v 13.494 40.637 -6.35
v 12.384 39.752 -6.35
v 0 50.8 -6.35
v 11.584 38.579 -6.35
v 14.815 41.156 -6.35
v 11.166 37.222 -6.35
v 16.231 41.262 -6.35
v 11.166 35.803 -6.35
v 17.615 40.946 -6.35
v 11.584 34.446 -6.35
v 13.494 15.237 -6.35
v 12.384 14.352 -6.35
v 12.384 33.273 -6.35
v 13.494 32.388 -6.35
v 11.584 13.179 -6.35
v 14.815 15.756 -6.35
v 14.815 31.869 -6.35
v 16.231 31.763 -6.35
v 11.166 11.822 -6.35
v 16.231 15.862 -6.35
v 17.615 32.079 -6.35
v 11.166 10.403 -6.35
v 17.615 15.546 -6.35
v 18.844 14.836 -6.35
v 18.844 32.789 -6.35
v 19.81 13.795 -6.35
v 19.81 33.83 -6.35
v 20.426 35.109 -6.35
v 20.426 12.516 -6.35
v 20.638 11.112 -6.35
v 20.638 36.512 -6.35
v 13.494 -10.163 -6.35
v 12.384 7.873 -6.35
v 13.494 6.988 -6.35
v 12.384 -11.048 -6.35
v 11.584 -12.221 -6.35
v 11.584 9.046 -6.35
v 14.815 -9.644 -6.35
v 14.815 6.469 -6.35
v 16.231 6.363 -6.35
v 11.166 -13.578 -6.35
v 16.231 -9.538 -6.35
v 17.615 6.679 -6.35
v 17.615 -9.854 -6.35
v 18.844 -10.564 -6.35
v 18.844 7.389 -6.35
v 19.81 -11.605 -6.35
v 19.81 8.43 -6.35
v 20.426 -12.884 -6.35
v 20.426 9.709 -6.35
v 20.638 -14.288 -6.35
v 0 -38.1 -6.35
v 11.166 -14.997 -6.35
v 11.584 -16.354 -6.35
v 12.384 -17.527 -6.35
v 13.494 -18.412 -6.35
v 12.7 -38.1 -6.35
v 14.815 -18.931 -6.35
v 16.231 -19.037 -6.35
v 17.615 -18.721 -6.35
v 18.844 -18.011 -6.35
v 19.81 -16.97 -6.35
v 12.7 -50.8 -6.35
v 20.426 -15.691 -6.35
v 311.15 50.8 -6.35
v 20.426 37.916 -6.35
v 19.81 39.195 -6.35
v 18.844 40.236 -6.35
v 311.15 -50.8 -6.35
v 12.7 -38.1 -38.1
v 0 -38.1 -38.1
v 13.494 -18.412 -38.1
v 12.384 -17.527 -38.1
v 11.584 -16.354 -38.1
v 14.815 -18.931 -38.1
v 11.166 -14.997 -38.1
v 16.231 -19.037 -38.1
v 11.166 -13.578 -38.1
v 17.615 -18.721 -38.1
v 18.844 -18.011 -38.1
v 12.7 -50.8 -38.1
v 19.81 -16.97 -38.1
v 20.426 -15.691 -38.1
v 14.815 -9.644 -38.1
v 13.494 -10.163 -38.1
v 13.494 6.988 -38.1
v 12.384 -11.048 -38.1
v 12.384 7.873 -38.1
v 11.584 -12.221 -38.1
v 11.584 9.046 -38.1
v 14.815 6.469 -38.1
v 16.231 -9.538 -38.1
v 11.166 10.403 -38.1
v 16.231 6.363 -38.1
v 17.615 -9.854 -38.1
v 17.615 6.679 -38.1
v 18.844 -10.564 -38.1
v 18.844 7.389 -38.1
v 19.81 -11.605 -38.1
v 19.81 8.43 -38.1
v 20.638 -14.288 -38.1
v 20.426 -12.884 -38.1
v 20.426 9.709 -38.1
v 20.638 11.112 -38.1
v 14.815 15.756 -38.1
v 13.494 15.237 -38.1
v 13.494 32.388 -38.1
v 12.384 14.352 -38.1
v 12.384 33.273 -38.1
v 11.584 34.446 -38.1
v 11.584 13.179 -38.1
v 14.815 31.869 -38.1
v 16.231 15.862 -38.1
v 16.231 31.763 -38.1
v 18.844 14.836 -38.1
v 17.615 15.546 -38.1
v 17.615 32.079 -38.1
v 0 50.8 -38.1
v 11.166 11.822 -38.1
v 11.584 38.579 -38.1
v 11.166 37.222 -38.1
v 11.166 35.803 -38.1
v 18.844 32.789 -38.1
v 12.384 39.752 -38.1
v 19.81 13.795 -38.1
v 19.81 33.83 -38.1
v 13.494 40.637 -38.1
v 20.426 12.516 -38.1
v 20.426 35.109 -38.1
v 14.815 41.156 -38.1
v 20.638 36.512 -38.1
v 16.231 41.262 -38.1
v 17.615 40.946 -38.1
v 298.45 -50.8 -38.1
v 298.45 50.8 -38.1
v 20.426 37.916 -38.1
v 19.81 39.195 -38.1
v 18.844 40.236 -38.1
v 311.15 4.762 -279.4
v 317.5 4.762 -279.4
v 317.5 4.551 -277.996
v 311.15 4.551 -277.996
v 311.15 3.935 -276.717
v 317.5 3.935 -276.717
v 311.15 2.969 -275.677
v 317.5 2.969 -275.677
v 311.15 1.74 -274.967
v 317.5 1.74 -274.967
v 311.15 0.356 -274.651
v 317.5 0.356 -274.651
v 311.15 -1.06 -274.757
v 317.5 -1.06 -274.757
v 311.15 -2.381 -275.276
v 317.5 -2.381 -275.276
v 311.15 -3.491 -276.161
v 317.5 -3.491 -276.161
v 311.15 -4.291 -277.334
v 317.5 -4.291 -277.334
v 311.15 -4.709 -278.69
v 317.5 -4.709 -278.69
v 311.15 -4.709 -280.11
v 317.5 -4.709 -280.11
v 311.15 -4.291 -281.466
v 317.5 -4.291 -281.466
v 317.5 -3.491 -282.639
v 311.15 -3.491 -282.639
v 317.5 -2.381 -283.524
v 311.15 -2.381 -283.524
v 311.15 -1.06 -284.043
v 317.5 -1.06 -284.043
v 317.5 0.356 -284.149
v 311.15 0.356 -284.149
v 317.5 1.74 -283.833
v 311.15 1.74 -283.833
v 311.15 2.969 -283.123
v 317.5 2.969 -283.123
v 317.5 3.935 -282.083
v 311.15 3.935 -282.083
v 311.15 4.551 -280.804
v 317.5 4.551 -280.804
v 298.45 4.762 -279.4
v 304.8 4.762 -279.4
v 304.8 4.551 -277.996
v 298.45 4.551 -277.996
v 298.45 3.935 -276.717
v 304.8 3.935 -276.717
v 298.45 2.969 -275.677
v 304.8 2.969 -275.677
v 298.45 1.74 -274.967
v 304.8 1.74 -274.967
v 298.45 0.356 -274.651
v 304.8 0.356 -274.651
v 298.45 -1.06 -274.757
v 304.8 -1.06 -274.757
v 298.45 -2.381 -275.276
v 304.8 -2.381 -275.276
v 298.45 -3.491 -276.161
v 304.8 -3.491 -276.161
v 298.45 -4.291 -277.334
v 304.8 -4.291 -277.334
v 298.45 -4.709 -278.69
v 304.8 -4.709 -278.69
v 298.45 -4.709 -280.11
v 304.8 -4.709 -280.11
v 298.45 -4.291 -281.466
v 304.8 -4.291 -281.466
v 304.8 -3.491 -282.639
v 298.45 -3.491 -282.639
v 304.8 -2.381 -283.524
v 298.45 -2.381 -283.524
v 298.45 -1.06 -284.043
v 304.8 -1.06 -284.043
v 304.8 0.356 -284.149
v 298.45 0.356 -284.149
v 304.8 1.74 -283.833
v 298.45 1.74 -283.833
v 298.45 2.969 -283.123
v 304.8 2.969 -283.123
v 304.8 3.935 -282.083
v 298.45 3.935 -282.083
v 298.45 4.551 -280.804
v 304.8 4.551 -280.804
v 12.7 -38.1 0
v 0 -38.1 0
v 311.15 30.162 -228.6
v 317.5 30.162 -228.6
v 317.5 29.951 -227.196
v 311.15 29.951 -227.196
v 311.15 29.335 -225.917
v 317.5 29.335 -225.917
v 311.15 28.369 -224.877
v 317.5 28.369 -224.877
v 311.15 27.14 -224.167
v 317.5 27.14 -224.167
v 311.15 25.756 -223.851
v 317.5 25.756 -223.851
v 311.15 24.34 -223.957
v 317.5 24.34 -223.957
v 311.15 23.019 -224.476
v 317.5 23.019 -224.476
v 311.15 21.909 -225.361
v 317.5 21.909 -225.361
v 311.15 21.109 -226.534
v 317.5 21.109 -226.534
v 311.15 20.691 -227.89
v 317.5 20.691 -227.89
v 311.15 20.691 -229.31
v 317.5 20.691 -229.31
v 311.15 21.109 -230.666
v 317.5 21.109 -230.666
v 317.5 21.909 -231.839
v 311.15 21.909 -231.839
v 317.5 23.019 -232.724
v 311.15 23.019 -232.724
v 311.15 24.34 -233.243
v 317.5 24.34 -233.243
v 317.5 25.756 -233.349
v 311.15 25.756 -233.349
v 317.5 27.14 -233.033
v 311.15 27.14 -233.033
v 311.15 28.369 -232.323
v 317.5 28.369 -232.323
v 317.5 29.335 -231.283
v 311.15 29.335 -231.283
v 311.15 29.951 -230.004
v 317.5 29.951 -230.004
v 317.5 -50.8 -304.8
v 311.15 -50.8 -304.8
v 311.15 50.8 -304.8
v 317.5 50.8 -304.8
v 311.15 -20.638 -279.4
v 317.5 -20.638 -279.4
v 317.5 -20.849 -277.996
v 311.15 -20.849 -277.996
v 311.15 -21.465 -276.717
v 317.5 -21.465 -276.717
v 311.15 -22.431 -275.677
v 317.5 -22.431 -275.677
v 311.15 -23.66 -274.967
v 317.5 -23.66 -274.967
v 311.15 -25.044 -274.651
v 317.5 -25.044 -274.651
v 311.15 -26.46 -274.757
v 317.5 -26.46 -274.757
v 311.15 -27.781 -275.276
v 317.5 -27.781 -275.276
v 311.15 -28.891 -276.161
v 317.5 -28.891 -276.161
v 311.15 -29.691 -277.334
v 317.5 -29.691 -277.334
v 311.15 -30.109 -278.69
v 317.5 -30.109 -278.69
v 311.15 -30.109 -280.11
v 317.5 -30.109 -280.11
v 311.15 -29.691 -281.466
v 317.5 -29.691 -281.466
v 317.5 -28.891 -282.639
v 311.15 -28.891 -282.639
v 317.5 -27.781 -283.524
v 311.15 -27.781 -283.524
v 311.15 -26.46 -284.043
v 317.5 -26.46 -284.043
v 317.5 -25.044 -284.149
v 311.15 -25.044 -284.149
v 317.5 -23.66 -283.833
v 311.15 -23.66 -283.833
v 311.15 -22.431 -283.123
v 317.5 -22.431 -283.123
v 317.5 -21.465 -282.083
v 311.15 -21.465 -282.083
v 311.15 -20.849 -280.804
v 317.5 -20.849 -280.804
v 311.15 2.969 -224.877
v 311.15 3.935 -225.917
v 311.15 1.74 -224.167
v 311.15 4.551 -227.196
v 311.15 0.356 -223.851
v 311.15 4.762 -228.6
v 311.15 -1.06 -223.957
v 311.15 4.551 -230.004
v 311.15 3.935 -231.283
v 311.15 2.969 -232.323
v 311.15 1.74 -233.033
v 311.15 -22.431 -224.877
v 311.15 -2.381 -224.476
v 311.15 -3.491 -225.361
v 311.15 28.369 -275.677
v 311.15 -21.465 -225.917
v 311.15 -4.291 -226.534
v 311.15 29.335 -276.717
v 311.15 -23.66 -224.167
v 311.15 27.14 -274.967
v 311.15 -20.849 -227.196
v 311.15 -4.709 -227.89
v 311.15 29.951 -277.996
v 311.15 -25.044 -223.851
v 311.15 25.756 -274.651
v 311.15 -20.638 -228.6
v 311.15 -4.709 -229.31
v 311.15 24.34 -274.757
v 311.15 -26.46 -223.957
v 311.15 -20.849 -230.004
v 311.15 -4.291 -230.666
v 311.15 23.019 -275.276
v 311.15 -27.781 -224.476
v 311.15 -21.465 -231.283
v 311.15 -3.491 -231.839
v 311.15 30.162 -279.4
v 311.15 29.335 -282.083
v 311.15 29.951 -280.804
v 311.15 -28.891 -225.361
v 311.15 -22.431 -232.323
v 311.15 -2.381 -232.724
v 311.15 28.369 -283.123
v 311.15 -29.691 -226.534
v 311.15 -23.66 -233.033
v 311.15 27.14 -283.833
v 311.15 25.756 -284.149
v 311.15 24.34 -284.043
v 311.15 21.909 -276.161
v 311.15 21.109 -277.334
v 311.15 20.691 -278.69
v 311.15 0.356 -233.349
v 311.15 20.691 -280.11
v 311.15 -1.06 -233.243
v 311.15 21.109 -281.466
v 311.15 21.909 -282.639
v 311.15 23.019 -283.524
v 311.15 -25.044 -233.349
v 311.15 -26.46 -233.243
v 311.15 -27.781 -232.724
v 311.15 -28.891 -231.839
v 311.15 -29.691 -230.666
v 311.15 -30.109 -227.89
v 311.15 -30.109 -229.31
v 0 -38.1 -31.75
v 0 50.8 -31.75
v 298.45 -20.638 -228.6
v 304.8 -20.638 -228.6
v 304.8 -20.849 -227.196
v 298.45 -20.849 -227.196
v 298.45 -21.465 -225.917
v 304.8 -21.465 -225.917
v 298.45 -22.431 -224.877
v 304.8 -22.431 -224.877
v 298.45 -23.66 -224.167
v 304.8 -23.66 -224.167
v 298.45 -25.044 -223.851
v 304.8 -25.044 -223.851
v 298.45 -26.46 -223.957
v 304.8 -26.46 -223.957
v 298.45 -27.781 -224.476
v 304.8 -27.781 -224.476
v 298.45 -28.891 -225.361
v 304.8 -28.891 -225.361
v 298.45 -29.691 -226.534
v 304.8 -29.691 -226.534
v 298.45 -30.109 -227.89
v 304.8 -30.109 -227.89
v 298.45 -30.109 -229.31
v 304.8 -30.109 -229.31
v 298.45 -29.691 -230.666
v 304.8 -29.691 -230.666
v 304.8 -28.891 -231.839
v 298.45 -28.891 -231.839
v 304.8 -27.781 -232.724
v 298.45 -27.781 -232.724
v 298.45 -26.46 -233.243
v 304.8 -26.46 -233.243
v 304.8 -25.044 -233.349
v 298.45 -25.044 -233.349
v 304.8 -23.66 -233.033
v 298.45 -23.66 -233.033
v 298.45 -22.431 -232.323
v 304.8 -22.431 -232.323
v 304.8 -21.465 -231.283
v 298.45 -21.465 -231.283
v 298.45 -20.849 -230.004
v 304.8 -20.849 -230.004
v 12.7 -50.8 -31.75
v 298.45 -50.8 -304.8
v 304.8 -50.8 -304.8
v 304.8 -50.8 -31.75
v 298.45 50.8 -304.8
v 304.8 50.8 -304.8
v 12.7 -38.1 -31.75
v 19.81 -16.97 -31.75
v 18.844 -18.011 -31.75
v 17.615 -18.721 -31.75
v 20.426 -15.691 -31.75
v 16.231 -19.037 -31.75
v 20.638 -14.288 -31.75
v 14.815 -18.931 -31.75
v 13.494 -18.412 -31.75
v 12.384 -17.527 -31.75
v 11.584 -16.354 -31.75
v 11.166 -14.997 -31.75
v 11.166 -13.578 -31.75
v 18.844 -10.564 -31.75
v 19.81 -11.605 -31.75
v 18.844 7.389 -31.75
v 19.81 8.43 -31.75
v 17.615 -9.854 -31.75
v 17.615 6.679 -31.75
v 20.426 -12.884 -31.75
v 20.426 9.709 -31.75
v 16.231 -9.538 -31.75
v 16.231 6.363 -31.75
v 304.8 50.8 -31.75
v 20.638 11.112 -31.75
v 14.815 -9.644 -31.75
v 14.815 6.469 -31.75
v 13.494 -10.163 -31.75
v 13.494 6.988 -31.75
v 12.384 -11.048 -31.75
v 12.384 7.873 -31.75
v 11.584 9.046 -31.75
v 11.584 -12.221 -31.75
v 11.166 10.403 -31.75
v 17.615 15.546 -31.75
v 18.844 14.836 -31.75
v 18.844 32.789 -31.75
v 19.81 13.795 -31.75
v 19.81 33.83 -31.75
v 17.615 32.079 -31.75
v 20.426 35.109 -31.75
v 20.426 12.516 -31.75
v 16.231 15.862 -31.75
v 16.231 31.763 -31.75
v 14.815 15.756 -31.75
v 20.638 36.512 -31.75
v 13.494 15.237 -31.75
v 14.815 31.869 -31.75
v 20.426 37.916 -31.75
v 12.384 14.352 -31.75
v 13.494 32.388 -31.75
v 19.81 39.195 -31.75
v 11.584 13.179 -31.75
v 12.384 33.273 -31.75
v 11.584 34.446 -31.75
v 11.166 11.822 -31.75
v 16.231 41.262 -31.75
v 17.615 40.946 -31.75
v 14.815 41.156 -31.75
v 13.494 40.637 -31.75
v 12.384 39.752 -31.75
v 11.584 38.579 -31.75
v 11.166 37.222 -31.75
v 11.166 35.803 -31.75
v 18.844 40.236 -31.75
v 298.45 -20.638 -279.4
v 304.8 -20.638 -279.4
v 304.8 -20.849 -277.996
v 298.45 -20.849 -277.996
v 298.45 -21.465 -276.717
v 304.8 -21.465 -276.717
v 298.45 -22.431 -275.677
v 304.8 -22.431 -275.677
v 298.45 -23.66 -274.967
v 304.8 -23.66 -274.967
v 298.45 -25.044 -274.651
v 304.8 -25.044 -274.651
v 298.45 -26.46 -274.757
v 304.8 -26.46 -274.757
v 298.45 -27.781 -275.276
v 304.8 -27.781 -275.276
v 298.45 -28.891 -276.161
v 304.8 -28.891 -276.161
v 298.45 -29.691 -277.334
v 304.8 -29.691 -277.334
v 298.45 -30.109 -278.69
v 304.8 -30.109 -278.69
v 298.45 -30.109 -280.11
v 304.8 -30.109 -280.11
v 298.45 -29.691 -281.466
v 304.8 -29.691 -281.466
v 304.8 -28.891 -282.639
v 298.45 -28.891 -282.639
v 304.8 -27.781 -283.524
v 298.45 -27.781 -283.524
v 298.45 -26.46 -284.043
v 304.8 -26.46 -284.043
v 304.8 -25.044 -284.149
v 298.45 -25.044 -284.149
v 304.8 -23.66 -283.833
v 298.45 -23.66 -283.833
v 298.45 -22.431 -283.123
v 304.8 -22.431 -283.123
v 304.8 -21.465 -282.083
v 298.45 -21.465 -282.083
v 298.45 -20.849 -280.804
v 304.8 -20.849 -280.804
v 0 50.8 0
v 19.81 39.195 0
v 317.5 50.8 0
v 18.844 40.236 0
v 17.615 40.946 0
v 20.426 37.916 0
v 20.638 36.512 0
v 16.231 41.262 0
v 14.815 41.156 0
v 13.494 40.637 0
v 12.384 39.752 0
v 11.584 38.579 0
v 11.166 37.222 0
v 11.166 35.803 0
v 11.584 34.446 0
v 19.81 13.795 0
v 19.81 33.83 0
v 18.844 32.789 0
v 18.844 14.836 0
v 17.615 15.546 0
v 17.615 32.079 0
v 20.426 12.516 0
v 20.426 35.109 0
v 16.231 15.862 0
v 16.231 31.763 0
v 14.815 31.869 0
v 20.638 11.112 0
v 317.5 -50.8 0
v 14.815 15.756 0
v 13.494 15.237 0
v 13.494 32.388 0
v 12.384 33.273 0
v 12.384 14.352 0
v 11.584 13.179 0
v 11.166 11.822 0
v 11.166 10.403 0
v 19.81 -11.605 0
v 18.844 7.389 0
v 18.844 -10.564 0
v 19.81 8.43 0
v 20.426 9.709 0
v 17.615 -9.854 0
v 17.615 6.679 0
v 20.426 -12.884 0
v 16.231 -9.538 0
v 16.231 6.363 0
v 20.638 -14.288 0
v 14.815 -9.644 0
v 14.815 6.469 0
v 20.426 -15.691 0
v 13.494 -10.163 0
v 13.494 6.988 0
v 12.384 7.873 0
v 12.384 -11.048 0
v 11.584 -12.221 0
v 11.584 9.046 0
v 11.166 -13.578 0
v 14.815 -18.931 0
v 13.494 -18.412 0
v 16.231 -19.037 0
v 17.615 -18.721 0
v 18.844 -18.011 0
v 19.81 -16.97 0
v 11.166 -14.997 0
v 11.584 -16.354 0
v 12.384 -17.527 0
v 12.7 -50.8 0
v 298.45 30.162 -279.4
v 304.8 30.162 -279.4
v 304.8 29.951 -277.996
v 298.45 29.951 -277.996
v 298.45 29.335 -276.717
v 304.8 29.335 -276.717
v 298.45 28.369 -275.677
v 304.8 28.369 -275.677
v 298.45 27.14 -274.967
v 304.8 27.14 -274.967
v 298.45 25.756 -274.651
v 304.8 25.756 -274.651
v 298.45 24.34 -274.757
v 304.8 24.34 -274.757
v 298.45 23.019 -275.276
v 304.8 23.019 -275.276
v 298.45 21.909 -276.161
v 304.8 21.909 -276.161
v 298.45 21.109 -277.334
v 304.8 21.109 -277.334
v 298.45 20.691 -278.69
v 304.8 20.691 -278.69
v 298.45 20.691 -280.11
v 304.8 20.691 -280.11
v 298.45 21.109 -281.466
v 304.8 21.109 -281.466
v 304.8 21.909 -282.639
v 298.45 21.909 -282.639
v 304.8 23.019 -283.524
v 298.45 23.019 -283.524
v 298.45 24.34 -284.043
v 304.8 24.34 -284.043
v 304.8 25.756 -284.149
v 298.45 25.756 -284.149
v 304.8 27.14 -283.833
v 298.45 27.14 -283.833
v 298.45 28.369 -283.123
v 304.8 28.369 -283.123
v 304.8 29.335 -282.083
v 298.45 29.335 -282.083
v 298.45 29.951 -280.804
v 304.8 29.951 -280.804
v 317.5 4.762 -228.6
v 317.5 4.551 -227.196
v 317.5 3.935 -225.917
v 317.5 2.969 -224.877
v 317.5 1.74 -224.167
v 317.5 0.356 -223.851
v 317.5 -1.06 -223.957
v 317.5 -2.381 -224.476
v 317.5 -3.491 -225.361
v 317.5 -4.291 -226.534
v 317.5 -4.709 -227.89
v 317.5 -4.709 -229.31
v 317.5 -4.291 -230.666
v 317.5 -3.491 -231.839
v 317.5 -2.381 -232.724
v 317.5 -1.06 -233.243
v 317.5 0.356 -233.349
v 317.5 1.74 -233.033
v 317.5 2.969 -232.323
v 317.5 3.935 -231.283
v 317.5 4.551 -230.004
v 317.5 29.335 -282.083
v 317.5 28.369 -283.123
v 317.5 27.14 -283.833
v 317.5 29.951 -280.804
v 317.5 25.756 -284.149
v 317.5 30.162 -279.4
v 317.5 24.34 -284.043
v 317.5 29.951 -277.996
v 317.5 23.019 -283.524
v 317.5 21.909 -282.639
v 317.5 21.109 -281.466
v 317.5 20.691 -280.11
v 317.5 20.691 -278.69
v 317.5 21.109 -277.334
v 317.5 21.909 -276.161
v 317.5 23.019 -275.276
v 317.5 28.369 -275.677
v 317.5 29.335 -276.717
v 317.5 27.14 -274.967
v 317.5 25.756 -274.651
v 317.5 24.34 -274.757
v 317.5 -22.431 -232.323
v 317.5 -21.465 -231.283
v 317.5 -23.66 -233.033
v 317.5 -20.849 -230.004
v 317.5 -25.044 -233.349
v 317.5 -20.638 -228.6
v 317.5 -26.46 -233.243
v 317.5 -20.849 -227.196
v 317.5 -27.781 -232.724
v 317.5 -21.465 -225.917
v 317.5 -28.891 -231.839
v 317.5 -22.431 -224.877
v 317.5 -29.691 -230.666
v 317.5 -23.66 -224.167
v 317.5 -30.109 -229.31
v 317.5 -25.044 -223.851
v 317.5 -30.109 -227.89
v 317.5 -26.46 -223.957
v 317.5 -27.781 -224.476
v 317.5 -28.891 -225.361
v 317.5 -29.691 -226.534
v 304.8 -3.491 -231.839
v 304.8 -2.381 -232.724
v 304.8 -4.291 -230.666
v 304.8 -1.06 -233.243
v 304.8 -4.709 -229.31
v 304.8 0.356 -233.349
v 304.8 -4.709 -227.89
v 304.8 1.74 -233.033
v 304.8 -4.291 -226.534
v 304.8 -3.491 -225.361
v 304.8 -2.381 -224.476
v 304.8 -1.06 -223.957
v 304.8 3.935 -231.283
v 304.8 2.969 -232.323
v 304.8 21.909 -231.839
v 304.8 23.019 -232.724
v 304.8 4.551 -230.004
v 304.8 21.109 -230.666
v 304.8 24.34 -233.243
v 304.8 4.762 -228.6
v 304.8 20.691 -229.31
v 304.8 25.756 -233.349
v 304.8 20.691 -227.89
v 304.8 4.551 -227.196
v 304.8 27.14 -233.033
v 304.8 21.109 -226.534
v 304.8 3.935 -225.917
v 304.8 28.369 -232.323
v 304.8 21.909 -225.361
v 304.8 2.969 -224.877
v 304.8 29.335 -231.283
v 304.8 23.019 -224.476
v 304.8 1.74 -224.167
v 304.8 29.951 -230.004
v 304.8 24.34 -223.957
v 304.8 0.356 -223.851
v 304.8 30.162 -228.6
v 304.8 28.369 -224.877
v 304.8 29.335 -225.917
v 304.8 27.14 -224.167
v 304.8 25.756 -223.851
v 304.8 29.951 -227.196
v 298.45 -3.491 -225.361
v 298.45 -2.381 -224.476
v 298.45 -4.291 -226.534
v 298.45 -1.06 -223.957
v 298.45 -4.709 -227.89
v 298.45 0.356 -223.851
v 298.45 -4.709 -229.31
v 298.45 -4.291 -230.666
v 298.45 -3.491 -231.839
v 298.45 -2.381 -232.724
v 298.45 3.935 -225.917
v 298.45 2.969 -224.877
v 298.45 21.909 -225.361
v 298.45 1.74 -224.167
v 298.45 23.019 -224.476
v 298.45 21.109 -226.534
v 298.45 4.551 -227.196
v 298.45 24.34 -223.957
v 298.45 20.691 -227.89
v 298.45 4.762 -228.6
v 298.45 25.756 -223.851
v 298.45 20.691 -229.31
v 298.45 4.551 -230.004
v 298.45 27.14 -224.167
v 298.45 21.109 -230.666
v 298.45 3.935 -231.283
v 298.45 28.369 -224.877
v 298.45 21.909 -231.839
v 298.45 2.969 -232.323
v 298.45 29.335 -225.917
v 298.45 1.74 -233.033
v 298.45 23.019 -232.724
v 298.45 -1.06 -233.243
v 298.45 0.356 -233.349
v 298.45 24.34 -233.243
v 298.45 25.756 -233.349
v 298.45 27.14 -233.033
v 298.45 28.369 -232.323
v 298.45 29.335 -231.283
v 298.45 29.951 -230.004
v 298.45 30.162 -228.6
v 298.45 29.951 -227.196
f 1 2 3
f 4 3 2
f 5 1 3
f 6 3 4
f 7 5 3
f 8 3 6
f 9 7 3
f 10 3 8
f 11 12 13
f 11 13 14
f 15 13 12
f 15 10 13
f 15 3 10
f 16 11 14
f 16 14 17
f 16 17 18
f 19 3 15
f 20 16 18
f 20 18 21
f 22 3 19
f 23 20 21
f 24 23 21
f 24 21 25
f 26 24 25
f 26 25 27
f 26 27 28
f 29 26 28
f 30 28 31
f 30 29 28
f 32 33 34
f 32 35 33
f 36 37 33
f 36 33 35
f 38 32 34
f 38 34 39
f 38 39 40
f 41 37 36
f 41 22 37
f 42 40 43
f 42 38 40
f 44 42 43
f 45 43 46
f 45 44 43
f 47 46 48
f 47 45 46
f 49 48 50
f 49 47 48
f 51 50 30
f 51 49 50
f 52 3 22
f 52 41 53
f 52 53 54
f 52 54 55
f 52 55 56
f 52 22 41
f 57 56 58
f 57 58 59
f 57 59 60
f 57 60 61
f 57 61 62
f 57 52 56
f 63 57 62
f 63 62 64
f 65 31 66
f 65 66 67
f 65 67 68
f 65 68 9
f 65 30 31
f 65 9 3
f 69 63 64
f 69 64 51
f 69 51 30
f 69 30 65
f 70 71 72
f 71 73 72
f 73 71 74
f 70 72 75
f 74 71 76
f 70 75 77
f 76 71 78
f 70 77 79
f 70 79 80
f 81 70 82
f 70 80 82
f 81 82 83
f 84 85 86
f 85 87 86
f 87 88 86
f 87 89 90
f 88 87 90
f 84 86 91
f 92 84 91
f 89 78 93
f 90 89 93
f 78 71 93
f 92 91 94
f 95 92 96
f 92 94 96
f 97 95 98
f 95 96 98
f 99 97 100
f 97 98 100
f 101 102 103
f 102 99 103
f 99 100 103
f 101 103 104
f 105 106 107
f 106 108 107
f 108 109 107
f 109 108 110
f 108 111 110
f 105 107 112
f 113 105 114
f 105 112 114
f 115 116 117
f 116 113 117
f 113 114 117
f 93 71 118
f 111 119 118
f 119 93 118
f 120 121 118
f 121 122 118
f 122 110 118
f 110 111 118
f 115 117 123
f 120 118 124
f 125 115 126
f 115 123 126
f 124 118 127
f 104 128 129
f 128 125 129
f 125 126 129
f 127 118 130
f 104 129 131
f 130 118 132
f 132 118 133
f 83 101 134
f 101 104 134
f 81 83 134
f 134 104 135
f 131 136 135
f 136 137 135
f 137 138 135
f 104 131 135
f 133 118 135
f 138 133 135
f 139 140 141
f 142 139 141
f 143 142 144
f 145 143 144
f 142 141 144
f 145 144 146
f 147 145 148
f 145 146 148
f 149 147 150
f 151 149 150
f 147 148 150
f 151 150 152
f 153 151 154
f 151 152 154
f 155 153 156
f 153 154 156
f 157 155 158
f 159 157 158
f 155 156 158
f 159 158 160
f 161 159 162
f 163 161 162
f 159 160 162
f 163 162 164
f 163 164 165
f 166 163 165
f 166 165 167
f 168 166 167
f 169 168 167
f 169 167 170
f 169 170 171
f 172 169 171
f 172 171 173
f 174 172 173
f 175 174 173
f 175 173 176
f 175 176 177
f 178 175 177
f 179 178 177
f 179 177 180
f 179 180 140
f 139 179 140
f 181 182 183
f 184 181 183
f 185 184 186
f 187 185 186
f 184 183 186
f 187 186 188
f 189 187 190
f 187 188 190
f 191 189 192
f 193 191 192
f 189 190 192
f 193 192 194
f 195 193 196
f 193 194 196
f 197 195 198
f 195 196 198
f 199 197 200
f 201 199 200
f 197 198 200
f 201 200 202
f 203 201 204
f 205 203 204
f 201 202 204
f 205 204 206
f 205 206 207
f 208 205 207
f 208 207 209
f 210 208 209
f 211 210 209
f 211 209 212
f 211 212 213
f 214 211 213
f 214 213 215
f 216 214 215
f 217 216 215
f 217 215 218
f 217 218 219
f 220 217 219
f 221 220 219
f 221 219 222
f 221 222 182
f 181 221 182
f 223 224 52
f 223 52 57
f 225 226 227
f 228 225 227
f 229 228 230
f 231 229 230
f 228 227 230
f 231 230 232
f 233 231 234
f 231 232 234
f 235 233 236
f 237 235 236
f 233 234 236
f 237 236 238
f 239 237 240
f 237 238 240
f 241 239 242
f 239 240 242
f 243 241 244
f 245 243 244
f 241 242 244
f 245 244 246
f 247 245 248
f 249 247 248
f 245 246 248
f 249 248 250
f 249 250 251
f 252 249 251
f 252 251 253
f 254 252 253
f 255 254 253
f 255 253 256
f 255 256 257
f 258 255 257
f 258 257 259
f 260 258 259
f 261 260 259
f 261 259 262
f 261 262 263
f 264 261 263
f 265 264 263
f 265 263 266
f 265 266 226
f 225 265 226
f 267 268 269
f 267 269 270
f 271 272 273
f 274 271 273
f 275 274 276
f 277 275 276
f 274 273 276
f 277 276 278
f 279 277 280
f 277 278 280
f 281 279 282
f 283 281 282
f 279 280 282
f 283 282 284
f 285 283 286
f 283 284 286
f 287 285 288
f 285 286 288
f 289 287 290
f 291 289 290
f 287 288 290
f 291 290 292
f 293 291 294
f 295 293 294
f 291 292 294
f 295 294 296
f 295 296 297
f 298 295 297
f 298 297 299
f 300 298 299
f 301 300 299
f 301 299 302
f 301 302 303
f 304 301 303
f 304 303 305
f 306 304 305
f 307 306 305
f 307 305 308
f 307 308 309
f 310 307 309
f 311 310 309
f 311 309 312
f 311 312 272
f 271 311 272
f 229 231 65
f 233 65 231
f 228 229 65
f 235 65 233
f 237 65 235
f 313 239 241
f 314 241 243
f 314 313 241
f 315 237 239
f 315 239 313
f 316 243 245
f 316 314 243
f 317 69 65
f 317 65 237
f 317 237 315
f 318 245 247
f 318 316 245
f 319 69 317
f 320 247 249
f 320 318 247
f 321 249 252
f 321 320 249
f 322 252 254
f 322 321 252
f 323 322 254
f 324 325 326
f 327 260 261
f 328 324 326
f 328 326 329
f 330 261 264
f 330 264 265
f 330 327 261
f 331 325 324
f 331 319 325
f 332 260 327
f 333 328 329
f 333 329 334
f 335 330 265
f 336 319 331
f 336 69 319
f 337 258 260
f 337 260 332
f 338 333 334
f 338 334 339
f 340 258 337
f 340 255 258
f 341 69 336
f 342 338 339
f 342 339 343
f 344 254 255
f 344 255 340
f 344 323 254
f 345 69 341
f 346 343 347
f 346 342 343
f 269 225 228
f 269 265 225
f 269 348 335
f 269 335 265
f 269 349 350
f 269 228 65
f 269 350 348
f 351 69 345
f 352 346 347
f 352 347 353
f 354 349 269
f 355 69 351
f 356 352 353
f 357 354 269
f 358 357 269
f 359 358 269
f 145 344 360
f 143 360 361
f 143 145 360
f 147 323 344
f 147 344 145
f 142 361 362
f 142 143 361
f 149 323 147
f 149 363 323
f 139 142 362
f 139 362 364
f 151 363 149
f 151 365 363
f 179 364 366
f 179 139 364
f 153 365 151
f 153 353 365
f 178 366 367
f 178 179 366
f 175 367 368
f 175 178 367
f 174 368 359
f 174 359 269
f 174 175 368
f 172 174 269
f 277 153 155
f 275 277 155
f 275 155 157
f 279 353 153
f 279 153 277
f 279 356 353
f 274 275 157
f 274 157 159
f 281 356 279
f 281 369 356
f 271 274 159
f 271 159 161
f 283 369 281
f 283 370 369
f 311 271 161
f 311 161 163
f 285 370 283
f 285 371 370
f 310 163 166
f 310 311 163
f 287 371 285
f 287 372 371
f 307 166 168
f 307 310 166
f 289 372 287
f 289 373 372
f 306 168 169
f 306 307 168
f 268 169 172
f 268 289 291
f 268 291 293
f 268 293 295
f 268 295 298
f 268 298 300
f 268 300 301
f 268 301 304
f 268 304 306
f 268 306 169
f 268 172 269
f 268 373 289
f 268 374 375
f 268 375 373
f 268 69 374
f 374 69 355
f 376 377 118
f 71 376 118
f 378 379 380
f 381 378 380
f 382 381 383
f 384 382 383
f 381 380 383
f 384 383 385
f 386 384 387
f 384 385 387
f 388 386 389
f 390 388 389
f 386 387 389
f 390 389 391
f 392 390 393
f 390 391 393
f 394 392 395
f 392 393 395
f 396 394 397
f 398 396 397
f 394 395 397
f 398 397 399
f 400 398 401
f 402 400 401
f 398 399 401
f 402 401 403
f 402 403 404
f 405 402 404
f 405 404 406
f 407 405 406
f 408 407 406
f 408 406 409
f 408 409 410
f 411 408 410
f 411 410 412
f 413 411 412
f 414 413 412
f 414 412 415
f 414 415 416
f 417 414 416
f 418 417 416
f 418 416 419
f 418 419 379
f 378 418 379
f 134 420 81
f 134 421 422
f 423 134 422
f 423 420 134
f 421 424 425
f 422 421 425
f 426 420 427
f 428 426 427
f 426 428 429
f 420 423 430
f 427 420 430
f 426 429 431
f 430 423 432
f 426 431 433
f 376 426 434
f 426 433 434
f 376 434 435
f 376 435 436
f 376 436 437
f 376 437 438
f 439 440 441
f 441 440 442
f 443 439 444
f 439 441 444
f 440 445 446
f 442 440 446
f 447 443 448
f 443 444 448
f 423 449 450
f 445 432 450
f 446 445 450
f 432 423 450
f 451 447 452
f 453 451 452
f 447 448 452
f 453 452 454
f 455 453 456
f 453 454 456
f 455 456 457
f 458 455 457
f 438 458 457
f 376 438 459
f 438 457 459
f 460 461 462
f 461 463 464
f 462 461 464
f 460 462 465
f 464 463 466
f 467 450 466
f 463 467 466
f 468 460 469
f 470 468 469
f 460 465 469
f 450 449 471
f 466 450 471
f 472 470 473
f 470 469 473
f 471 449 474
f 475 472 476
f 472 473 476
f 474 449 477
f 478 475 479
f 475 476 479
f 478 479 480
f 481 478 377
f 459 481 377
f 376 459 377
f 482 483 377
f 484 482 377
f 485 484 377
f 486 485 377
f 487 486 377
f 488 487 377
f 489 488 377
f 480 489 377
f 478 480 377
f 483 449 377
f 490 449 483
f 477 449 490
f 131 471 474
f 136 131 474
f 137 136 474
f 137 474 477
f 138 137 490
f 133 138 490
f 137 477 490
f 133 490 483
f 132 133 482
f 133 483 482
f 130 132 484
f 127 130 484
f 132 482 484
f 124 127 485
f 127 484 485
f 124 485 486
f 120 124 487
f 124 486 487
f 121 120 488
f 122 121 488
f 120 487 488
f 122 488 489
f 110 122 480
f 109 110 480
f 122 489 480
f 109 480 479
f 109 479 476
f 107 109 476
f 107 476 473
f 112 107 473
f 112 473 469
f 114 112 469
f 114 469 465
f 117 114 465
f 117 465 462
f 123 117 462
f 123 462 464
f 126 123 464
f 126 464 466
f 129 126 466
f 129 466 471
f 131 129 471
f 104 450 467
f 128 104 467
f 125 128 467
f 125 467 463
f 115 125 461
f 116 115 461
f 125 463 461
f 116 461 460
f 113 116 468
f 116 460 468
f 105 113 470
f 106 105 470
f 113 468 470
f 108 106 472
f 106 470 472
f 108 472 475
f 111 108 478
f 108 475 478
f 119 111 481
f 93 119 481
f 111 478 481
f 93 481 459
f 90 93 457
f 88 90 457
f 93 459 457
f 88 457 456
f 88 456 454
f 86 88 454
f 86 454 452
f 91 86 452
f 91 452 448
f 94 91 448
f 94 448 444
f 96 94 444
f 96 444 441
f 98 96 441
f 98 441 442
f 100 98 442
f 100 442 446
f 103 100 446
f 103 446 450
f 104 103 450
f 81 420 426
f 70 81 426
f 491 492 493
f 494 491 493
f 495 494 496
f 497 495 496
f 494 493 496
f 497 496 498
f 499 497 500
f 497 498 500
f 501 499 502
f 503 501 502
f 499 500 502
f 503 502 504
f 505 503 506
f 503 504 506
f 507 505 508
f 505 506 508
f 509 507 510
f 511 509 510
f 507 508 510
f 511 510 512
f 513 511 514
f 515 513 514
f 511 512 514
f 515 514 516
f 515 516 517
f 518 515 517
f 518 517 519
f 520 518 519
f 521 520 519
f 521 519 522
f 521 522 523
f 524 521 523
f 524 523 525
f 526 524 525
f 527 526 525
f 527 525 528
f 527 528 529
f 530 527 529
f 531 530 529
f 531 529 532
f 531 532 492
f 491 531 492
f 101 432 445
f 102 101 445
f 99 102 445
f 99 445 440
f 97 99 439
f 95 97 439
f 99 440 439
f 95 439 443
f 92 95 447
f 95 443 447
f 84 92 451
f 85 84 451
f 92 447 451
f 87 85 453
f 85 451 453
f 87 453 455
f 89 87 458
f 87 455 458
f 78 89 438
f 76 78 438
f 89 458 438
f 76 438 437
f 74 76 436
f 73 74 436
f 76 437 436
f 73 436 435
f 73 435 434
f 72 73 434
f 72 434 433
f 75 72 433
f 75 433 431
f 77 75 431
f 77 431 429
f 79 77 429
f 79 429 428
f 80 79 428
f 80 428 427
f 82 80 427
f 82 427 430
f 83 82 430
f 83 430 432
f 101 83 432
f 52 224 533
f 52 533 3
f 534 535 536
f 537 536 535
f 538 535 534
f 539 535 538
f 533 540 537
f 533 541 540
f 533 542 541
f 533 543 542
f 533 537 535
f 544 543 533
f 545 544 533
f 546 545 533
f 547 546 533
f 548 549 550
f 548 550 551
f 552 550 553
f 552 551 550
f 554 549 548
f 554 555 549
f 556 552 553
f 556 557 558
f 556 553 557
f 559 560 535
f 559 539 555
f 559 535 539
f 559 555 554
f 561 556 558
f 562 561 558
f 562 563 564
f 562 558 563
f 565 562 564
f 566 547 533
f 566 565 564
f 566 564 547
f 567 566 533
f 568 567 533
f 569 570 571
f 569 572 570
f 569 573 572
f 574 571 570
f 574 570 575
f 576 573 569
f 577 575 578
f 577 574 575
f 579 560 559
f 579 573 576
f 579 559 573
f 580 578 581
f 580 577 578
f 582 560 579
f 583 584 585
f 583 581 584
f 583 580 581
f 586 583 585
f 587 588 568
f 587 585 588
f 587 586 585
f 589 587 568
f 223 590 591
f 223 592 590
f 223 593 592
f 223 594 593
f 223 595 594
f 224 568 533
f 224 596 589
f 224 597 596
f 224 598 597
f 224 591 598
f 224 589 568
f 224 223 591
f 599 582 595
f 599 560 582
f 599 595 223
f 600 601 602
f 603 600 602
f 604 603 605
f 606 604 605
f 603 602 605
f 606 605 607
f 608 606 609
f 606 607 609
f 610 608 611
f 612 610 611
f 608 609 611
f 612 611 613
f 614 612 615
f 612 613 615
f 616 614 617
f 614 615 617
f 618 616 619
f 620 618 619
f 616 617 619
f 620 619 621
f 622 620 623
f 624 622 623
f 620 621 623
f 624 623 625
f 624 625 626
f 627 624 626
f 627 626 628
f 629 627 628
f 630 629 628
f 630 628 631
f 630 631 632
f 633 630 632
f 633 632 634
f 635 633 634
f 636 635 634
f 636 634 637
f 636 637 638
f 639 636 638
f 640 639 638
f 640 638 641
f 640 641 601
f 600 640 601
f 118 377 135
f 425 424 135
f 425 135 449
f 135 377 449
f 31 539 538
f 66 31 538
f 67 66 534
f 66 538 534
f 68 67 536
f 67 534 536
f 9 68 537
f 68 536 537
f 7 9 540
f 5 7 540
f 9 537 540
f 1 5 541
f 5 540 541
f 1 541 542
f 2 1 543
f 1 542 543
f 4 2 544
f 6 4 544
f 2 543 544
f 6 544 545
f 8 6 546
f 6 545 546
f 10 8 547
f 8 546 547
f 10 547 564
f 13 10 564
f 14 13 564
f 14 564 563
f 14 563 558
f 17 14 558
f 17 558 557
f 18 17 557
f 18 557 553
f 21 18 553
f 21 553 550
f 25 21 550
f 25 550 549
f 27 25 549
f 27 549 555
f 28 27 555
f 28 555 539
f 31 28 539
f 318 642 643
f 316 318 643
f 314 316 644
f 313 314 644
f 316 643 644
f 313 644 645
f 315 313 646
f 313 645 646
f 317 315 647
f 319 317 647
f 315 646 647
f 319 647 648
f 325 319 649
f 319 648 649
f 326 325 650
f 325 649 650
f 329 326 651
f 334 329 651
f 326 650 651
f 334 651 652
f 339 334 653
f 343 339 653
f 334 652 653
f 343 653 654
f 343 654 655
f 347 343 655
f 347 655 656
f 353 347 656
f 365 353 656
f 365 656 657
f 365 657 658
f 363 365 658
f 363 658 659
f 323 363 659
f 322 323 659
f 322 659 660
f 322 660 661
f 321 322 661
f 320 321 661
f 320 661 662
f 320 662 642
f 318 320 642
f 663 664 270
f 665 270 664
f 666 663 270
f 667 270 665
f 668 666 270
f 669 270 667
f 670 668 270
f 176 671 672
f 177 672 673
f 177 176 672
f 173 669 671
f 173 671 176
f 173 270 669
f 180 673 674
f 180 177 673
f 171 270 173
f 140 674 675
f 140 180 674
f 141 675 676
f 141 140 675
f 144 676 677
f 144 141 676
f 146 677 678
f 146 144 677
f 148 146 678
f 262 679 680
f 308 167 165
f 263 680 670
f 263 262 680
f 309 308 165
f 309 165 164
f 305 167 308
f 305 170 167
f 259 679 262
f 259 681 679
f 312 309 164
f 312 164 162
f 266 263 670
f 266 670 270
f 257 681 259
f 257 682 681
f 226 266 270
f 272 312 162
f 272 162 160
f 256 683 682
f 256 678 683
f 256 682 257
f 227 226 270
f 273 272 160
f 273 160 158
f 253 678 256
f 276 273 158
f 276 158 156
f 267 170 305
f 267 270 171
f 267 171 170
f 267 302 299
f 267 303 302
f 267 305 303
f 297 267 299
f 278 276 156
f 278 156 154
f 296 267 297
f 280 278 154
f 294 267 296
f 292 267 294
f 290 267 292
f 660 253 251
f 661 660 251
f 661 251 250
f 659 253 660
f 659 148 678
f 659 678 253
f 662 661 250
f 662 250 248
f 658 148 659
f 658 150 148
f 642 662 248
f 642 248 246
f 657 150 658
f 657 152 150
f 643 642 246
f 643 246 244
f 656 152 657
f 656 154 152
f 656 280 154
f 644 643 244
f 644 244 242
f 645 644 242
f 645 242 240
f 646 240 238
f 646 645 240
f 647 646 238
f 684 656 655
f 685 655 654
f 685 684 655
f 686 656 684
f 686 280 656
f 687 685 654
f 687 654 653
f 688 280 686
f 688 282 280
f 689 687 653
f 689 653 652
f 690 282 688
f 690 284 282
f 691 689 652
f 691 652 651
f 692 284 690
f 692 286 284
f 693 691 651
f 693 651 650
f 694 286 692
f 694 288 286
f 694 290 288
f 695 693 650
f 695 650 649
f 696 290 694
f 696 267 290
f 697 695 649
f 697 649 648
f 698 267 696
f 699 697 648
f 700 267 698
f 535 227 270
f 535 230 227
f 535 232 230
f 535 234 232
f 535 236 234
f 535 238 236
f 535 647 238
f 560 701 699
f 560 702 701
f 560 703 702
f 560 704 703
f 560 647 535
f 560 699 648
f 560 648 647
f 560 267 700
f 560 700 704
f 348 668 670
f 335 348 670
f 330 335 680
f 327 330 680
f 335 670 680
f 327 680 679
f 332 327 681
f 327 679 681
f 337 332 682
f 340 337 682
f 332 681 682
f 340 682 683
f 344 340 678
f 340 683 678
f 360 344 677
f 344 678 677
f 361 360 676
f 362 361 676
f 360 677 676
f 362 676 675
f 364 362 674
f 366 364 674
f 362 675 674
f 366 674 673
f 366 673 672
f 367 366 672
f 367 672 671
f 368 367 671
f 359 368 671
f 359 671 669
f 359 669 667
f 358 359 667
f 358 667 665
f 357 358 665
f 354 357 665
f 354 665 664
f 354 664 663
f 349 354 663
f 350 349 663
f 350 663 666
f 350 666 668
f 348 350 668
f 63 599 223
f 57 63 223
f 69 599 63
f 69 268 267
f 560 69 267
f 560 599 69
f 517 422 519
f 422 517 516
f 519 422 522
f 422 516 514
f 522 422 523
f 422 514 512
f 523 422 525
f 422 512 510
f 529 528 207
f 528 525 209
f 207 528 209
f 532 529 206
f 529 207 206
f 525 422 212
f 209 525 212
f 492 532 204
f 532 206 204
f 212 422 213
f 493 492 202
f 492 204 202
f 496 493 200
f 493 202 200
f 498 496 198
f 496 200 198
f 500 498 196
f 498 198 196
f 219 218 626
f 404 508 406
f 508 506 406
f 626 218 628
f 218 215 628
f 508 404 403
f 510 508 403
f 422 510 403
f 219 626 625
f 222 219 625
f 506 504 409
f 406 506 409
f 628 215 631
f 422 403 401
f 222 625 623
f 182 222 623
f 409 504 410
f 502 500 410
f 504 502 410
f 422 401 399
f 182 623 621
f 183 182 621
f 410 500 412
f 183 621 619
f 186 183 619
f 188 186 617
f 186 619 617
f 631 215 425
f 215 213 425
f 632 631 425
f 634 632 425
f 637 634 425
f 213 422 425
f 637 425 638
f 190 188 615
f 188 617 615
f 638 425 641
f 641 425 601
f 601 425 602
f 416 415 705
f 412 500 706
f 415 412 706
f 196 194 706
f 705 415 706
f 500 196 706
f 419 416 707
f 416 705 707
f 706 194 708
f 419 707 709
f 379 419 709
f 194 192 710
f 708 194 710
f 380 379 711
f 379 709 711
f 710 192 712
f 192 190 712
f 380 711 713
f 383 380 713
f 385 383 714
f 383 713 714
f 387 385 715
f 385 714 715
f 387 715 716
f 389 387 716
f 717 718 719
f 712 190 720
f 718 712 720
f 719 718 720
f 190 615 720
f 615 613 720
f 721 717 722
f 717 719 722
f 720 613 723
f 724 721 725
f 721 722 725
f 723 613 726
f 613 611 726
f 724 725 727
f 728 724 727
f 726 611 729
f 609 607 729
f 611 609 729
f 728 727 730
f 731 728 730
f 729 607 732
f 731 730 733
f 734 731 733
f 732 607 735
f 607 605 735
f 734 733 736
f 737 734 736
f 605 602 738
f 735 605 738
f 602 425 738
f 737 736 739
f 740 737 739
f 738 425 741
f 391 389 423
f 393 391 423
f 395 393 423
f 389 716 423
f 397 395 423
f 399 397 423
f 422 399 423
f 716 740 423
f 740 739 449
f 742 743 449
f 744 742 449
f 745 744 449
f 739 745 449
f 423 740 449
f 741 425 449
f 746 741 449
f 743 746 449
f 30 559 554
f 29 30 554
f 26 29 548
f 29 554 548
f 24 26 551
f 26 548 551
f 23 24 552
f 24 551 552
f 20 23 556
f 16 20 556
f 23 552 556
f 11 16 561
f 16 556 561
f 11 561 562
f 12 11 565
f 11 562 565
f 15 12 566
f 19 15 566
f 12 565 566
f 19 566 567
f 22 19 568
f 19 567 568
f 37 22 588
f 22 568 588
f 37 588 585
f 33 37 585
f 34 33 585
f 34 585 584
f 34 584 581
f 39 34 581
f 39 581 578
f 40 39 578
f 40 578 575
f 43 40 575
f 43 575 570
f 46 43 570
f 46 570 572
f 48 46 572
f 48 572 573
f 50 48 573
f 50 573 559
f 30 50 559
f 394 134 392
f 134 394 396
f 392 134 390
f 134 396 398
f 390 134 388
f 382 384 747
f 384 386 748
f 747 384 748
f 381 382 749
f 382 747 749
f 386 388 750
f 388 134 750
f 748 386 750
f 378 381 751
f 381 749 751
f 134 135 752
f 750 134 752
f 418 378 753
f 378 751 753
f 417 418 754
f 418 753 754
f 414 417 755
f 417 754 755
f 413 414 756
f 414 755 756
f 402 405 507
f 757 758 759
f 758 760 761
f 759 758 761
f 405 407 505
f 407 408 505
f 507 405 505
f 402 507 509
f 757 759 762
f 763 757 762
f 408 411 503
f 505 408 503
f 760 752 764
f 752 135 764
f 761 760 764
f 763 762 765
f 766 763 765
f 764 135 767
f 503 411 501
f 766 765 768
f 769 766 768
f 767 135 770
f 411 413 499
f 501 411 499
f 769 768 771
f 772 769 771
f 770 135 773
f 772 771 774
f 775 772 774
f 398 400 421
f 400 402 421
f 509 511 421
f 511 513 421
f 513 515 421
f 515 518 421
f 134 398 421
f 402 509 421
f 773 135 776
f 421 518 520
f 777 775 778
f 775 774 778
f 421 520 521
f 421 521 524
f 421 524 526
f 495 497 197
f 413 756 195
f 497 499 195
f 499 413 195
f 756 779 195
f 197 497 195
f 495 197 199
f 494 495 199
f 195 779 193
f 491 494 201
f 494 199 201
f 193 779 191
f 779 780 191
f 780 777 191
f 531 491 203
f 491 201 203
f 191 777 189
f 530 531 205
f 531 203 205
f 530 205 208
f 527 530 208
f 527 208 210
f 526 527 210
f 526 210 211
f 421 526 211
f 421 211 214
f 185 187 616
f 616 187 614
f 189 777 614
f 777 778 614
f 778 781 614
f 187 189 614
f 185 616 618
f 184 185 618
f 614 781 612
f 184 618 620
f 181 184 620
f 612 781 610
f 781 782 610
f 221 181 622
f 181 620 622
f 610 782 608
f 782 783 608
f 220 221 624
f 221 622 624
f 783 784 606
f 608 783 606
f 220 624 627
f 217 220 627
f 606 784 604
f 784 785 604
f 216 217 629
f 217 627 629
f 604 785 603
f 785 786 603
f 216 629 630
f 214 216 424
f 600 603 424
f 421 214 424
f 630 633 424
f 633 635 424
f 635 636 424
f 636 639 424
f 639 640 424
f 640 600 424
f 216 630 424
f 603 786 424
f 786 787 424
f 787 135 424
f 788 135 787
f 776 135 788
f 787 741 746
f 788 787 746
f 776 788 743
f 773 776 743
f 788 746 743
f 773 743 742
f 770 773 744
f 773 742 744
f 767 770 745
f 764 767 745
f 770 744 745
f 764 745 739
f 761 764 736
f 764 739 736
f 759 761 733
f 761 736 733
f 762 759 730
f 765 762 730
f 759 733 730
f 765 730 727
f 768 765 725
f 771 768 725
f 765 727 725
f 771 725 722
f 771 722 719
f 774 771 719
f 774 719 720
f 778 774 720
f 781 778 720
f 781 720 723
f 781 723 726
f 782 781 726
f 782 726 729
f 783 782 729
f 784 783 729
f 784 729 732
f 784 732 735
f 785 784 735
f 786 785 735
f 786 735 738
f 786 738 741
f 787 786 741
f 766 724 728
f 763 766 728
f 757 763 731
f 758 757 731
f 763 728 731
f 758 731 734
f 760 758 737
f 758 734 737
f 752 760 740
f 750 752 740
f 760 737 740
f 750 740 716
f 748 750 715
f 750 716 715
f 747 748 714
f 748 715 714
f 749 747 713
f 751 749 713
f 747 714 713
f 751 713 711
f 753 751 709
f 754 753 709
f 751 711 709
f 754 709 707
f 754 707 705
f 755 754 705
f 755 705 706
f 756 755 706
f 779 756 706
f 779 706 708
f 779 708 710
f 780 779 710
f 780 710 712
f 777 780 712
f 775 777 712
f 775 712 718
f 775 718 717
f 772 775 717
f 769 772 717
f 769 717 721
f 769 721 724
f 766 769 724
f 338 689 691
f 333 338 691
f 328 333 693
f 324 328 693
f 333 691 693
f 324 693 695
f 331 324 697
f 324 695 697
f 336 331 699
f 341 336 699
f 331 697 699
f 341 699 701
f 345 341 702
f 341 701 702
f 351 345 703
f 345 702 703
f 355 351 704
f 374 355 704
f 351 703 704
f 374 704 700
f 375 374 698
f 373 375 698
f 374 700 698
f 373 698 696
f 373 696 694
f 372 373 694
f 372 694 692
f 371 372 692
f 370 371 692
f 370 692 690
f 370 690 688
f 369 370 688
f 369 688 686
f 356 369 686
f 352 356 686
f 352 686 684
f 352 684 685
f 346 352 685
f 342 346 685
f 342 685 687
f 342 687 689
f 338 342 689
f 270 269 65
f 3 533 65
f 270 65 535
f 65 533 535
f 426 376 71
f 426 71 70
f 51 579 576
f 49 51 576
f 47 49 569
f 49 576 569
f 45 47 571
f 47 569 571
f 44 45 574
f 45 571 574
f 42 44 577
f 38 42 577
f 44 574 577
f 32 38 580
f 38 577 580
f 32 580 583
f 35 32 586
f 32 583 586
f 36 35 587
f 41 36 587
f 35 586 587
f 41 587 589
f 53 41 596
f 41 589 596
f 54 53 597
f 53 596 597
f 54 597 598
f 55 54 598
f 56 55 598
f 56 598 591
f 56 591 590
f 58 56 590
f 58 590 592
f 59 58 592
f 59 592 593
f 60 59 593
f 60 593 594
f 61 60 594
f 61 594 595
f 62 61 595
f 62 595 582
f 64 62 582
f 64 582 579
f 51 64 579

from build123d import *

# Parameters (mm, degrees)
F1_DEPTH = 50.8
F2_R     = 4.7625
F3_DEPTH = 317.501
F4_R     = 4.7625
F4_W     = 12.7
F4_H     = 12.7
F5_DEPTH = 304.801


with BuildPart() as f1:
    # F0 (on Front) → F1 (new body, symmetric)
    with BuildSketch(Plane.XZ):
        Polygon((304.8, -31.75), (0, -31.75), (0, -38.1), (298.45, -38.1), (298.45, -304.8), (304.8, -304.8), align=None)
        Polygon((0, -6.35), (311.15, -6.35), (311.15, -304.8), (317.5, -304.8), (317.5, 0), (0, 0), align=None)
    extrude(amount=F1_DEPTH, both=True)

    # F2 (on face) → F3 (cut, through all)
    with BuildSketch(Plane.YZ.offset(317.5)):
        with Locations((-25.4, -279.4)):
            Circle(F2_R)
        with Locations((-25.4, -228.6)):
            Circle(F2_R)
        with Locations((0, -279.4)):
            Circle(F2_R)
        with Locations((0, -228.6)):
            Circle(F2_R)
        with Locations((25.4, -279.4)):
            Circle(F2_R)
        with Locations((25.4, -228.6)):
            Circle(F2_R)
    extrude(amount=-F3_DEPTH, mode=Mode.SUBTRACT)

    # F4 (on face) → F5 (cut, through all)
    with BuildSketch(Plane.XY):
        with Locations((15.875, -14.2875)):
            Circle(F4_R)
        with Locations((15.875, 11.1125)):
            Circle(F4_R)
        with Locations((15.875, 36.5125)):
            Circle(F4_R)
        with Locations((6.35, -44.45)):
            Rectangle(F4_W, F4_H)
    extrude(amount=-F5_DEPTH, mode=Mode.SUBTRACT)


solid = f1.part
